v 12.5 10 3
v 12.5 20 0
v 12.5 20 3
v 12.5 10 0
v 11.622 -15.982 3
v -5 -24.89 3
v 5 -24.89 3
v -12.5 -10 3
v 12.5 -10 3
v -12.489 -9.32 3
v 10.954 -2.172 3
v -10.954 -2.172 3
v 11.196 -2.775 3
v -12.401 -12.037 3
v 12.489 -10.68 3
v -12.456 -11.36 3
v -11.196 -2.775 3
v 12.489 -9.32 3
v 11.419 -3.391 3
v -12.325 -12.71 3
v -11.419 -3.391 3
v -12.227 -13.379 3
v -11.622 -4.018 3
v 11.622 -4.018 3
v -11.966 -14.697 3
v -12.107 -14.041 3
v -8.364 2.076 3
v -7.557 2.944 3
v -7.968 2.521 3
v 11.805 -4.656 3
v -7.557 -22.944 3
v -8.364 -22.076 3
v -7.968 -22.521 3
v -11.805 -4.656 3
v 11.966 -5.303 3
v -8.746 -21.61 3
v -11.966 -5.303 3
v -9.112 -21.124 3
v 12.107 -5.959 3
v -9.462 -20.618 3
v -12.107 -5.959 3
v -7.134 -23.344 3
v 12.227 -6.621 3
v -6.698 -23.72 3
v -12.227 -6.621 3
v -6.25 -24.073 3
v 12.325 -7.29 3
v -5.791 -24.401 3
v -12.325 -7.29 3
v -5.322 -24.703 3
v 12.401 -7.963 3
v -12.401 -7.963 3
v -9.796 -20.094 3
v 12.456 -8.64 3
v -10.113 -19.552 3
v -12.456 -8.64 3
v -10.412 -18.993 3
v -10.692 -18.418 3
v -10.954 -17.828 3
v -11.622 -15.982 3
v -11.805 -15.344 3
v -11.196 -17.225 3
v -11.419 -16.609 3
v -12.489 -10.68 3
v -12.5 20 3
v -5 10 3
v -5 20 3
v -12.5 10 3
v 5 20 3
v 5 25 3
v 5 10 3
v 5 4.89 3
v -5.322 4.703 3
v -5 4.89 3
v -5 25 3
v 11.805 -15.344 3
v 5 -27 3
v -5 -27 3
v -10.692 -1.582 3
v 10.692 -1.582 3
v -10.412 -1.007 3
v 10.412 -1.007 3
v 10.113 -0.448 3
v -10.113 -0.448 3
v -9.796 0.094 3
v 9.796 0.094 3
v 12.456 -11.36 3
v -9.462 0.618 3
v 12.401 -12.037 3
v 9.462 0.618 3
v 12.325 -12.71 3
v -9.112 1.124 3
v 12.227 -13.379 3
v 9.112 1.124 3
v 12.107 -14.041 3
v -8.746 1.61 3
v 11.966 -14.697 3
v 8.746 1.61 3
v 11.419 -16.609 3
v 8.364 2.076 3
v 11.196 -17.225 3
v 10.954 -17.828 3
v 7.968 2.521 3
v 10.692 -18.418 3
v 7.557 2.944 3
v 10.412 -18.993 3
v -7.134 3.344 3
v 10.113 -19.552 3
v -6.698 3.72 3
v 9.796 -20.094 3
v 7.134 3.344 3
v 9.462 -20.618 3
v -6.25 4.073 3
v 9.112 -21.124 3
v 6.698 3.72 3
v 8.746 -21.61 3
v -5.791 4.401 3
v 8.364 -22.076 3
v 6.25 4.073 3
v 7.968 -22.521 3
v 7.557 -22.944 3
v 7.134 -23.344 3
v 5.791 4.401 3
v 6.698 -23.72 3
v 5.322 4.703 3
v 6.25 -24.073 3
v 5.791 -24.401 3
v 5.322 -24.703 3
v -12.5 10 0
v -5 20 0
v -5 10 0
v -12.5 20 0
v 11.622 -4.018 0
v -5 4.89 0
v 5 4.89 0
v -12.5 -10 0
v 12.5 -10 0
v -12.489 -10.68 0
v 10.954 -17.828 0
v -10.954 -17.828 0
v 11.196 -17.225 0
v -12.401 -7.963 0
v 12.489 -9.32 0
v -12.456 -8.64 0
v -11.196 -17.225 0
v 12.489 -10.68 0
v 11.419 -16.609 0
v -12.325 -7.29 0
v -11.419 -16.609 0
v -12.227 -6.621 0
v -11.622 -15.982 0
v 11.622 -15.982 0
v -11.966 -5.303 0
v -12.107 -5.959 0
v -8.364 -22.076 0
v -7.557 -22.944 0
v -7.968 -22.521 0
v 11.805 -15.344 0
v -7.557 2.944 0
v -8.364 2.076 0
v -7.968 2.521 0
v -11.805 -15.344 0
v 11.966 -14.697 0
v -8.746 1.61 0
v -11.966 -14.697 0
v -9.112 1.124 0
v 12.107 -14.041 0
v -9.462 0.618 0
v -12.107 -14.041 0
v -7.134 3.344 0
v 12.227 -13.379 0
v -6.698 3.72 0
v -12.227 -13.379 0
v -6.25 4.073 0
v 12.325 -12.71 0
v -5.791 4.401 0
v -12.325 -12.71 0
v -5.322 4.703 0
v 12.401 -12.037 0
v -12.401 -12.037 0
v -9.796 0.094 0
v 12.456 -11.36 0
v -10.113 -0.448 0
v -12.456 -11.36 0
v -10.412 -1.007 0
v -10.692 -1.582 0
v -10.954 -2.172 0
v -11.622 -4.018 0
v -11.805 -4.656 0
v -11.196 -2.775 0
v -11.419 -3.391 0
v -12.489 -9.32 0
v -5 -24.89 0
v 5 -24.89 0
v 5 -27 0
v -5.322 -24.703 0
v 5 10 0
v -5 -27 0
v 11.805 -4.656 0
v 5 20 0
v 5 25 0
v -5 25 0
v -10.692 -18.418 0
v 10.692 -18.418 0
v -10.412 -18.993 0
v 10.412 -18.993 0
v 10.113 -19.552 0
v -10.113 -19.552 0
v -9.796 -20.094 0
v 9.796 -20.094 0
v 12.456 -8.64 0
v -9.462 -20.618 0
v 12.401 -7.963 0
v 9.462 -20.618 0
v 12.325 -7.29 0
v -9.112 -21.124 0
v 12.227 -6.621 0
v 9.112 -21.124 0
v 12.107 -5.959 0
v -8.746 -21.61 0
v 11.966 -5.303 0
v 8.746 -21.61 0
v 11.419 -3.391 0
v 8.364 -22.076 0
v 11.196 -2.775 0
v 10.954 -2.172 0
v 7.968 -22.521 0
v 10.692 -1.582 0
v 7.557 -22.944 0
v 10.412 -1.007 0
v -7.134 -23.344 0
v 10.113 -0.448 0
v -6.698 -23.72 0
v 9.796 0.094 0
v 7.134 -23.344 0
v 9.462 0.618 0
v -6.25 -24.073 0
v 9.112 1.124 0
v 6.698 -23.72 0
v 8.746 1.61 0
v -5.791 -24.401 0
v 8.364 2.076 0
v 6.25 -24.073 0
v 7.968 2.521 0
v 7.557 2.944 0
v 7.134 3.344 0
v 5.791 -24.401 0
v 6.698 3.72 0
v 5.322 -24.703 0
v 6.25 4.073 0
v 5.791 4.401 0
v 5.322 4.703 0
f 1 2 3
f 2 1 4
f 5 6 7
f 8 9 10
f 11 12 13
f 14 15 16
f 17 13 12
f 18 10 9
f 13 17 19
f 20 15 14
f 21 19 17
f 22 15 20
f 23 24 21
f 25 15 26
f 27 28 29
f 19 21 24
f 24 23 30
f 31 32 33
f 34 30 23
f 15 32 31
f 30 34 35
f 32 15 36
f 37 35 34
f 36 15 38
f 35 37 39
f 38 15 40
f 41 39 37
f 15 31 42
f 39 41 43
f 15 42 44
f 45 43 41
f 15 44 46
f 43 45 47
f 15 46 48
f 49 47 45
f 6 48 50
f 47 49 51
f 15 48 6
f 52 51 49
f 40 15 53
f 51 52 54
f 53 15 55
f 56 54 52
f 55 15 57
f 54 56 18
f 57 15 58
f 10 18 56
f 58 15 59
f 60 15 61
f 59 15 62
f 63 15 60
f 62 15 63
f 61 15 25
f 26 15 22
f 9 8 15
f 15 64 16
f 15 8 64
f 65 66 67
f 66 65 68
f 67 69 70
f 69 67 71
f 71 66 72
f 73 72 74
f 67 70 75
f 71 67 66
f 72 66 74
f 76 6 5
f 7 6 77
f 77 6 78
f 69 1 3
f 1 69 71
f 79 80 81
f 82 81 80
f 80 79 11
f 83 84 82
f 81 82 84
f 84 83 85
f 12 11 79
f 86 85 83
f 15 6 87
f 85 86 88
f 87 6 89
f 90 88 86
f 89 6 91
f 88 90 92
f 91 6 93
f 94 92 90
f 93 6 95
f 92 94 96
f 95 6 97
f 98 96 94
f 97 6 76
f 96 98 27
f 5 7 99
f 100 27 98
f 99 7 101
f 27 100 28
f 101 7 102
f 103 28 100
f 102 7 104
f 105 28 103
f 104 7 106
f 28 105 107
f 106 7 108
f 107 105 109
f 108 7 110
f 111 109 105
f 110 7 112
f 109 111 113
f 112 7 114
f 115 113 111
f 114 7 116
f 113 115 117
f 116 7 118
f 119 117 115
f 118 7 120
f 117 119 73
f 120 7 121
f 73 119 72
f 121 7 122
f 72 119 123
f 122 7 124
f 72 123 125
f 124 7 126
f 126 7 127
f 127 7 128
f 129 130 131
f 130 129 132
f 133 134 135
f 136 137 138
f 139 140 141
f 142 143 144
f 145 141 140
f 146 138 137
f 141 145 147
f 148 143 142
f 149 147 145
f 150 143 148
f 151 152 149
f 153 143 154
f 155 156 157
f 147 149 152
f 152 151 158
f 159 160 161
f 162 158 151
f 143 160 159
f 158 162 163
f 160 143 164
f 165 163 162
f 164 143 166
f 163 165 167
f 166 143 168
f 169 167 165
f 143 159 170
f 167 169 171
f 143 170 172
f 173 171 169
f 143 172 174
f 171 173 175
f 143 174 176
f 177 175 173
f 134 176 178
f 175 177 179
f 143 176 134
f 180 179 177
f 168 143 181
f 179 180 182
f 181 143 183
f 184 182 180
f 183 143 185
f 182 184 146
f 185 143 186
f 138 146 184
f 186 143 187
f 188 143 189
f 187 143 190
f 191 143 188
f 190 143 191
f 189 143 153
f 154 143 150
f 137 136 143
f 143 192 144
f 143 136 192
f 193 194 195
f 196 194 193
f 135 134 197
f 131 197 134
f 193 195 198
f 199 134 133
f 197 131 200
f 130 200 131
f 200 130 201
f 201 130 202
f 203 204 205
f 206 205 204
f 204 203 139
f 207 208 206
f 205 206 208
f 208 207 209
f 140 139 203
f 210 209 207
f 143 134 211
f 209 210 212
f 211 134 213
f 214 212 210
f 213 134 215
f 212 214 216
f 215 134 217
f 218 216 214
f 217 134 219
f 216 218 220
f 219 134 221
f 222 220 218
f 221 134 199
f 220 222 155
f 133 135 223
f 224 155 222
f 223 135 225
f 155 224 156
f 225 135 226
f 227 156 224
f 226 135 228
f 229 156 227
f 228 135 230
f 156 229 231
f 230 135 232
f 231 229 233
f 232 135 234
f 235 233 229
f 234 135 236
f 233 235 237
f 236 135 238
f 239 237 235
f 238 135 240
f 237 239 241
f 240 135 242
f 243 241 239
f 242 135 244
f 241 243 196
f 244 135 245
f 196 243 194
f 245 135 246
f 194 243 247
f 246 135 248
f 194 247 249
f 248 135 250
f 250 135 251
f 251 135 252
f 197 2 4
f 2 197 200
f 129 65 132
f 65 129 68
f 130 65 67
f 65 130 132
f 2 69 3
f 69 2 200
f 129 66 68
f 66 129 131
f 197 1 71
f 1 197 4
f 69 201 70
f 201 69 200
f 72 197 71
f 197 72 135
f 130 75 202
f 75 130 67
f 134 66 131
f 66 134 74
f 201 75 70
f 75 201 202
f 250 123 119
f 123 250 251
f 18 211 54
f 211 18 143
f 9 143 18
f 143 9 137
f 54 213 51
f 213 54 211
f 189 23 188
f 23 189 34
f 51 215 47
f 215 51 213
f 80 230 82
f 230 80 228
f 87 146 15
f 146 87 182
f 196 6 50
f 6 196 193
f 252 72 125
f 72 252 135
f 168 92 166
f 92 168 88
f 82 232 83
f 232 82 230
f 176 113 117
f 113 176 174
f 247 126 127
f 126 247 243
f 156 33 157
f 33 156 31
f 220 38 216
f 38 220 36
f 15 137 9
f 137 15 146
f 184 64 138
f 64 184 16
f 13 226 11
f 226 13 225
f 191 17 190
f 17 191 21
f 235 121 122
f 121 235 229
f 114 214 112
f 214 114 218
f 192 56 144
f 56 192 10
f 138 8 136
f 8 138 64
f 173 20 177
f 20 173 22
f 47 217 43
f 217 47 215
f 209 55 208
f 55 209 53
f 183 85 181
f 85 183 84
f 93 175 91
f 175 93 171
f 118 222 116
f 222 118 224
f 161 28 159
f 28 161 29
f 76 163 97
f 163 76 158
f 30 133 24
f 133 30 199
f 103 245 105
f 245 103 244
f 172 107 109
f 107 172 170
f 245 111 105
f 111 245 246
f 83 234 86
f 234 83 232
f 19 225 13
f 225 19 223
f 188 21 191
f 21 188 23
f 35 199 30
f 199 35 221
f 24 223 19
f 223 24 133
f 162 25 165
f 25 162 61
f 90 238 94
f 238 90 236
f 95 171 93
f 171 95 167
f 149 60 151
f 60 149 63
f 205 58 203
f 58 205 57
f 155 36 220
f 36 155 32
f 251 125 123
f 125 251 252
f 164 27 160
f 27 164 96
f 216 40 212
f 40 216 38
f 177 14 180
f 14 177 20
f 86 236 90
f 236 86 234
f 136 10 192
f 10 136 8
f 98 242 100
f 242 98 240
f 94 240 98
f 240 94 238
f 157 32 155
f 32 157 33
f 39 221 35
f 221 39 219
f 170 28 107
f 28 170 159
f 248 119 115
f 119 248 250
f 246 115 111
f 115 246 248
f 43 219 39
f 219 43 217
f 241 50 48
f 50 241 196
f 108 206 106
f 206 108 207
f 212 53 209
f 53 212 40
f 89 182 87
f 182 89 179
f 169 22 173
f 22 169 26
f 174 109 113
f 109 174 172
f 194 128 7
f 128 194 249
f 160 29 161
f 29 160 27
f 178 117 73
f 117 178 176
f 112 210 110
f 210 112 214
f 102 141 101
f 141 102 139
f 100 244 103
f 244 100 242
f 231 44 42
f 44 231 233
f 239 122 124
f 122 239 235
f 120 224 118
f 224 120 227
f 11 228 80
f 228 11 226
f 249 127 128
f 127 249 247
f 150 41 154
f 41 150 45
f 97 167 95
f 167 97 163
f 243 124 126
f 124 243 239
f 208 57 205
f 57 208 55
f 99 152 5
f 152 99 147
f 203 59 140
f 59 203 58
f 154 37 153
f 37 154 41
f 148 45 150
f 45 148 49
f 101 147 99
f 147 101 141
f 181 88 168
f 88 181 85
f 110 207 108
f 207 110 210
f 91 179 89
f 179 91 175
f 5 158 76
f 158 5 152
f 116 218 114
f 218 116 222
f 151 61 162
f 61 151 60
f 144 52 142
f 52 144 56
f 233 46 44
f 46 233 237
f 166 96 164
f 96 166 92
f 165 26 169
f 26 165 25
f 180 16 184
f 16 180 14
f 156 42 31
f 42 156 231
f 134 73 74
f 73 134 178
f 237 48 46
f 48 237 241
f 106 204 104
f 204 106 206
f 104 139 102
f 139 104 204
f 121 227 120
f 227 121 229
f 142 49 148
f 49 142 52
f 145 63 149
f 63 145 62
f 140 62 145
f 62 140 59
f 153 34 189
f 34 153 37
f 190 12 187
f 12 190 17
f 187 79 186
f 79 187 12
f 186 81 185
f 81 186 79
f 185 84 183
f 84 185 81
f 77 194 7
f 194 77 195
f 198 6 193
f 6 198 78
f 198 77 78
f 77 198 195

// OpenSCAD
inmm = 25.4;

a = 9*inmm;
a2 = (a-(.25*inmm));
b = 1.5*inmm;
$fn=150;

ratio = .778;
//ratio = 1;


module assem1()
{
difference()
{
    
    union()
    {
       
        band();
        side();
        rotate([0,0,180])
            side();
    }
    translate([-6*inmm, -6*inmm, -12*inmm])
    {
        cube([12*inmm,12*inmm,12*inmm]);
    }
}
}
//assem1();
//assem2();
//translate([0,0,147])
//rotate([90,0,90])
cross();

module cross()
{
    translate([-12.5,10,0])
        cube([25,10,3]);
    translate([-5,0,0])
        cube([10,25,3]);
    translate([0,-10,0])
        scale([1.0,1.3,1.0]) cylinder(d=25, 3); 
    translate([-5,-27,0])
        cube([10,25,3]);
    
}
module assem2()
{
difference()
{
    rotate([90,0,0])
    translate([0,0,-.5*inmm])
    {
        difference()
        {
            cylinder(d=a+.5*inmm, h=1*inmm);
            cylinder(d=a+.25*inmm, h=1*inmm);
        }
    }
    difference()
    {
        scale([1.0,ratio,1.0]) cylinder(d=a* 3, h=b); 
        scale([1.0,ratio,1.0]) cylinder(d=a2, h=b+.1); 
    }
     translate([-6*inmm, -6*inmm, -12*inmm])
        {
            cube([12*inmm,12*inmm,12*inmm]);
        }
}
}

module band()
{
    difference()
    {
        scale([1.0,ratio,1.0]) cylinder(d=a+.15*inmm, h=b); 
        scale([1.0,ratio,1.0]) cylinder(d=a2, h=b+.1); 
    }
}



module side()
{
    translate([0,4,0])
    rotate([25,0,0])
    difference()
    {
        
        scale([1,ratio,1])
        {
            difference()
            {
                sphere(d=a+.25*inmm);
                sphere(d=a);
            }
        }
        translate([-6*inmm, 0, 0])
        {
            cube([12*inmm,12*inmm,12*inmm]);
        }

        translate([-6*inmm, -6*inmm, -12*inmm])
        {
            cube([12*inmm,12*inmm,12*inmm]);
        }
    }
}
